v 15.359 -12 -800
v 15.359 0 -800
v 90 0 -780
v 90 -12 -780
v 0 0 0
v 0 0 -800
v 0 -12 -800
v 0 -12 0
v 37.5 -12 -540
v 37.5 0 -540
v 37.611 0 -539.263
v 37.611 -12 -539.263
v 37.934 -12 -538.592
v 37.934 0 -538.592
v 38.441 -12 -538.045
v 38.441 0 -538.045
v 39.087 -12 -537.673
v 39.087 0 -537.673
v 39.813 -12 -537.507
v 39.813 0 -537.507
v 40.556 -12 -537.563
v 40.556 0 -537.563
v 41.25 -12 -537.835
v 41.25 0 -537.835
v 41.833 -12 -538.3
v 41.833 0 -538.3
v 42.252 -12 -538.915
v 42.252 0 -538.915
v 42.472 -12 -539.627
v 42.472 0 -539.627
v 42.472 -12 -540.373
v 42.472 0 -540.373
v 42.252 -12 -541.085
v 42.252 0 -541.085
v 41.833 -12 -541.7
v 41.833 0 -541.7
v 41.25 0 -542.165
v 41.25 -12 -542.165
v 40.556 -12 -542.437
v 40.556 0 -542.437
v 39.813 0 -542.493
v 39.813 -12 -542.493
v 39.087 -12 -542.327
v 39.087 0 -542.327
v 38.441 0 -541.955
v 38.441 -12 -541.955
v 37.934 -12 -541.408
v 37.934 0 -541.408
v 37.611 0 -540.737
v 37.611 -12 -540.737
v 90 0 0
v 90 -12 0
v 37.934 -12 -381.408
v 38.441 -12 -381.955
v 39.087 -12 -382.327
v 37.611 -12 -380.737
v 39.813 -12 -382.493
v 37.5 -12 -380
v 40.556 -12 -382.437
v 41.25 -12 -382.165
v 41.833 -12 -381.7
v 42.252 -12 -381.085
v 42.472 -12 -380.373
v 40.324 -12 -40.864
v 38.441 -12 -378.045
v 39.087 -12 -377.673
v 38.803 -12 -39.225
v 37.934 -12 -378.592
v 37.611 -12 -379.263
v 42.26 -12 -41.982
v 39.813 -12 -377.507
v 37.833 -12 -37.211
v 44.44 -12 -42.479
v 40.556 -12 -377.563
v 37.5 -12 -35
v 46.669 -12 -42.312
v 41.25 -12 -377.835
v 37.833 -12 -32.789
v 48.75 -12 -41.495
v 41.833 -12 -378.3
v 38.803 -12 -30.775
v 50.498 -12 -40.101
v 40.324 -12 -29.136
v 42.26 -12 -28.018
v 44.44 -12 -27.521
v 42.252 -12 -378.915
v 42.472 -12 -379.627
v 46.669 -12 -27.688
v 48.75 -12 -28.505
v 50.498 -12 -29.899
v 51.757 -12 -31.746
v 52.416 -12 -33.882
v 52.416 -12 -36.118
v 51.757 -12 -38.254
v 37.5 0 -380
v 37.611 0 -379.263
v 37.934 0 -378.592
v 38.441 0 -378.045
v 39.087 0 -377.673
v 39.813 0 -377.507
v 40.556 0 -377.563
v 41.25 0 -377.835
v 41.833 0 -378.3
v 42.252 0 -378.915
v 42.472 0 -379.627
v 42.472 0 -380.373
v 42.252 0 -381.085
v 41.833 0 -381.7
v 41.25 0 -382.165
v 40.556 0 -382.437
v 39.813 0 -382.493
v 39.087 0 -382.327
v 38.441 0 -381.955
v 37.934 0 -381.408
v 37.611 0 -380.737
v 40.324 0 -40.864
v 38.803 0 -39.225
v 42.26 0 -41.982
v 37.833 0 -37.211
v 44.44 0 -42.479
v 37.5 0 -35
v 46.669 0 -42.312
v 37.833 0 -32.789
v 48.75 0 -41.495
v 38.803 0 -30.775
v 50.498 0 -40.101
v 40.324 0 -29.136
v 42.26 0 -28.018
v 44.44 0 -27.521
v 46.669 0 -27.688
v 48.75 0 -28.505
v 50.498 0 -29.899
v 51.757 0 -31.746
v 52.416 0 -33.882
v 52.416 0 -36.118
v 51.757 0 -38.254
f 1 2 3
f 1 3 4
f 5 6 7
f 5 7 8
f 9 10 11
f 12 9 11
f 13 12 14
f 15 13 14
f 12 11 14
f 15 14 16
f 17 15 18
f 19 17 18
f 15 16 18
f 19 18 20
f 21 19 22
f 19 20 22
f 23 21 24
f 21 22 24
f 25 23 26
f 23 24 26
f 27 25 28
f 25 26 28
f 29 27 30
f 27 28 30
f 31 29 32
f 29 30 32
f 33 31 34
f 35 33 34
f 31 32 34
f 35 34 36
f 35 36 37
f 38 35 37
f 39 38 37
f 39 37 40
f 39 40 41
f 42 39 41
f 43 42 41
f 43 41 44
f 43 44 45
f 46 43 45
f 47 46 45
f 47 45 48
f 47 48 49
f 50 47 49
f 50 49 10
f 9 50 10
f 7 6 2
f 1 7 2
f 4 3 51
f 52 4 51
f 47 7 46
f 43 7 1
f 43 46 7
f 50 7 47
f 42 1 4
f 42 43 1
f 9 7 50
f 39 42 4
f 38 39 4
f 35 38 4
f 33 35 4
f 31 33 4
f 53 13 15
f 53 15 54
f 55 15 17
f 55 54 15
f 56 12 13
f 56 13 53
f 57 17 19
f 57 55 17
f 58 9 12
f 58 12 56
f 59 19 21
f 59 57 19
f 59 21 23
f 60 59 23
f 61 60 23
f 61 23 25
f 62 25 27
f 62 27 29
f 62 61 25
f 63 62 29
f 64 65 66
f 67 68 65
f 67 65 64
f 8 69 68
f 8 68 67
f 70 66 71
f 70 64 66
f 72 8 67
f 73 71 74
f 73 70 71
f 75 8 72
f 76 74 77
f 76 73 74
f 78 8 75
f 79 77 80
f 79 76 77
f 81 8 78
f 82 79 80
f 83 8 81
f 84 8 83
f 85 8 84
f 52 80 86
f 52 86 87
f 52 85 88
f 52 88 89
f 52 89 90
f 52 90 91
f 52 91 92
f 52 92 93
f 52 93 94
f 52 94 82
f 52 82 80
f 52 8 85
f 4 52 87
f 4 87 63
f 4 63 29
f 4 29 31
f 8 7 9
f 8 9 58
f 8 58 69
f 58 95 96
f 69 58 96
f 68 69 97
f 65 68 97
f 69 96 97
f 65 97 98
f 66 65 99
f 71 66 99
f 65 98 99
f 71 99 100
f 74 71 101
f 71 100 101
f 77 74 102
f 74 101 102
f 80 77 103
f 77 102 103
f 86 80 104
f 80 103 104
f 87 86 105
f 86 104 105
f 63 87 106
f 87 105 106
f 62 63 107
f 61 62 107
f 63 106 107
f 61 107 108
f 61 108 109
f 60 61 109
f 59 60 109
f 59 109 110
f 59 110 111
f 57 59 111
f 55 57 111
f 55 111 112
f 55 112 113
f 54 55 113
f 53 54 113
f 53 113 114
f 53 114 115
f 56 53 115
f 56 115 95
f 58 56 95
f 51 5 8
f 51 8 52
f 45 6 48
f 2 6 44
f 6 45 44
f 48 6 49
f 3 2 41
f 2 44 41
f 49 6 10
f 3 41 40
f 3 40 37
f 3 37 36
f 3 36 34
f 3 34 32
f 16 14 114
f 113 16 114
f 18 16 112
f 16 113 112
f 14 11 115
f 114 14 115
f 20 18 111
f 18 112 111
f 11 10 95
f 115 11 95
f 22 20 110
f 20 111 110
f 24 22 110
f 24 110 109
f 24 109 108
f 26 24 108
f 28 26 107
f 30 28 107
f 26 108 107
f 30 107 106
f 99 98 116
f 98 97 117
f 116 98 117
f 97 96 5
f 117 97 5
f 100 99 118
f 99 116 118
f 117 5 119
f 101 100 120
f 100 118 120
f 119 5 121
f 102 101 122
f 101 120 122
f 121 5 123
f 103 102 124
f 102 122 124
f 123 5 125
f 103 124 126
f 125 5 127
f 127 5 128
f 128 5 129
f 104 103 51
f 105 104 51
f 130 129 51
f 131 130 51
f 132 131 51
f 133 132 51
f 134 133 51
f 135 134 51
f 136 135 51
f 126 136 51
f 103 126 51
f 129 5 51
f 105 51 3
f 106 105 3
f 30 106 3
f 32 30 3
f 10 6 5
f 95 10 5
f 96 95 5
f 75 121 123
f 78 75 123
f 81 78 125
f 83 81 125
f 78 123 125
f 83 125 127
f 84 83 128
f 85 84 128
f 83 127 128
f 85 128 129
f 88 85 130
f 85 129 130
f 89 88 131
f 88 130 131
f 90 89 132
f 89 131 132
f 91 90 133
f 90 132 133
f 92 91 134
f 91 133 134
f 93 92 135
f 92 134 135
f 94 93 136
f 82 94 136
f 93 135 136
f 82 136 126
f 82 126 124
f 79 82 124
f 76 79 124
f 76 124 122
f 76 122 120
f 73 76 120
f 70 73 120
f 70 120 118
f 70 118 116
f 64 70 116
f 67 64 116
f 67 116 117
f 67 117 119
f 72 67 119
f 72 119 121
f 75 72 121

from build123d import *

# Parameters (mm, degrees)
F0_W     = 90
F0_H     = 800
F1_DEPTH = 12
F3_D     = 15
F4_SIZE2 = 74.6410161514
F4_SIZE  = 20
F6_D     = 5


with BuildPart() as f1:
    # F0 (on Front) → F1 (new body)
    with BuildSketch(Plane.XZ):
        with Locations((45, -400)):
            Rectangle(F0_W, F0_H)
    extrude(amount=F1_DEPTH)

    # F3 (through all)
    with Locations(Plane.XZ.offset(12)):
        with Locations((45, -35)):
            Hole(F3_D / 2)

    # F4
    f4_edges = [f1.edges().sort_by_distance(p)[0] for p in [
        (90, -6, -800),
    ]]
    f4_side = f1.faces().sort_by_distance((90, -6, -400))[0]
    chamfer(f4_edges, length=F4_SIZE, length2=F4_SIZE2, reference=f4_side)

    # F6 (through all)
    with Locations(Plane.XZ.offset(12)):
        with Locations((40, -380), (40, -540)):
            Hole(F6_D / 2)


solid = f1.part
